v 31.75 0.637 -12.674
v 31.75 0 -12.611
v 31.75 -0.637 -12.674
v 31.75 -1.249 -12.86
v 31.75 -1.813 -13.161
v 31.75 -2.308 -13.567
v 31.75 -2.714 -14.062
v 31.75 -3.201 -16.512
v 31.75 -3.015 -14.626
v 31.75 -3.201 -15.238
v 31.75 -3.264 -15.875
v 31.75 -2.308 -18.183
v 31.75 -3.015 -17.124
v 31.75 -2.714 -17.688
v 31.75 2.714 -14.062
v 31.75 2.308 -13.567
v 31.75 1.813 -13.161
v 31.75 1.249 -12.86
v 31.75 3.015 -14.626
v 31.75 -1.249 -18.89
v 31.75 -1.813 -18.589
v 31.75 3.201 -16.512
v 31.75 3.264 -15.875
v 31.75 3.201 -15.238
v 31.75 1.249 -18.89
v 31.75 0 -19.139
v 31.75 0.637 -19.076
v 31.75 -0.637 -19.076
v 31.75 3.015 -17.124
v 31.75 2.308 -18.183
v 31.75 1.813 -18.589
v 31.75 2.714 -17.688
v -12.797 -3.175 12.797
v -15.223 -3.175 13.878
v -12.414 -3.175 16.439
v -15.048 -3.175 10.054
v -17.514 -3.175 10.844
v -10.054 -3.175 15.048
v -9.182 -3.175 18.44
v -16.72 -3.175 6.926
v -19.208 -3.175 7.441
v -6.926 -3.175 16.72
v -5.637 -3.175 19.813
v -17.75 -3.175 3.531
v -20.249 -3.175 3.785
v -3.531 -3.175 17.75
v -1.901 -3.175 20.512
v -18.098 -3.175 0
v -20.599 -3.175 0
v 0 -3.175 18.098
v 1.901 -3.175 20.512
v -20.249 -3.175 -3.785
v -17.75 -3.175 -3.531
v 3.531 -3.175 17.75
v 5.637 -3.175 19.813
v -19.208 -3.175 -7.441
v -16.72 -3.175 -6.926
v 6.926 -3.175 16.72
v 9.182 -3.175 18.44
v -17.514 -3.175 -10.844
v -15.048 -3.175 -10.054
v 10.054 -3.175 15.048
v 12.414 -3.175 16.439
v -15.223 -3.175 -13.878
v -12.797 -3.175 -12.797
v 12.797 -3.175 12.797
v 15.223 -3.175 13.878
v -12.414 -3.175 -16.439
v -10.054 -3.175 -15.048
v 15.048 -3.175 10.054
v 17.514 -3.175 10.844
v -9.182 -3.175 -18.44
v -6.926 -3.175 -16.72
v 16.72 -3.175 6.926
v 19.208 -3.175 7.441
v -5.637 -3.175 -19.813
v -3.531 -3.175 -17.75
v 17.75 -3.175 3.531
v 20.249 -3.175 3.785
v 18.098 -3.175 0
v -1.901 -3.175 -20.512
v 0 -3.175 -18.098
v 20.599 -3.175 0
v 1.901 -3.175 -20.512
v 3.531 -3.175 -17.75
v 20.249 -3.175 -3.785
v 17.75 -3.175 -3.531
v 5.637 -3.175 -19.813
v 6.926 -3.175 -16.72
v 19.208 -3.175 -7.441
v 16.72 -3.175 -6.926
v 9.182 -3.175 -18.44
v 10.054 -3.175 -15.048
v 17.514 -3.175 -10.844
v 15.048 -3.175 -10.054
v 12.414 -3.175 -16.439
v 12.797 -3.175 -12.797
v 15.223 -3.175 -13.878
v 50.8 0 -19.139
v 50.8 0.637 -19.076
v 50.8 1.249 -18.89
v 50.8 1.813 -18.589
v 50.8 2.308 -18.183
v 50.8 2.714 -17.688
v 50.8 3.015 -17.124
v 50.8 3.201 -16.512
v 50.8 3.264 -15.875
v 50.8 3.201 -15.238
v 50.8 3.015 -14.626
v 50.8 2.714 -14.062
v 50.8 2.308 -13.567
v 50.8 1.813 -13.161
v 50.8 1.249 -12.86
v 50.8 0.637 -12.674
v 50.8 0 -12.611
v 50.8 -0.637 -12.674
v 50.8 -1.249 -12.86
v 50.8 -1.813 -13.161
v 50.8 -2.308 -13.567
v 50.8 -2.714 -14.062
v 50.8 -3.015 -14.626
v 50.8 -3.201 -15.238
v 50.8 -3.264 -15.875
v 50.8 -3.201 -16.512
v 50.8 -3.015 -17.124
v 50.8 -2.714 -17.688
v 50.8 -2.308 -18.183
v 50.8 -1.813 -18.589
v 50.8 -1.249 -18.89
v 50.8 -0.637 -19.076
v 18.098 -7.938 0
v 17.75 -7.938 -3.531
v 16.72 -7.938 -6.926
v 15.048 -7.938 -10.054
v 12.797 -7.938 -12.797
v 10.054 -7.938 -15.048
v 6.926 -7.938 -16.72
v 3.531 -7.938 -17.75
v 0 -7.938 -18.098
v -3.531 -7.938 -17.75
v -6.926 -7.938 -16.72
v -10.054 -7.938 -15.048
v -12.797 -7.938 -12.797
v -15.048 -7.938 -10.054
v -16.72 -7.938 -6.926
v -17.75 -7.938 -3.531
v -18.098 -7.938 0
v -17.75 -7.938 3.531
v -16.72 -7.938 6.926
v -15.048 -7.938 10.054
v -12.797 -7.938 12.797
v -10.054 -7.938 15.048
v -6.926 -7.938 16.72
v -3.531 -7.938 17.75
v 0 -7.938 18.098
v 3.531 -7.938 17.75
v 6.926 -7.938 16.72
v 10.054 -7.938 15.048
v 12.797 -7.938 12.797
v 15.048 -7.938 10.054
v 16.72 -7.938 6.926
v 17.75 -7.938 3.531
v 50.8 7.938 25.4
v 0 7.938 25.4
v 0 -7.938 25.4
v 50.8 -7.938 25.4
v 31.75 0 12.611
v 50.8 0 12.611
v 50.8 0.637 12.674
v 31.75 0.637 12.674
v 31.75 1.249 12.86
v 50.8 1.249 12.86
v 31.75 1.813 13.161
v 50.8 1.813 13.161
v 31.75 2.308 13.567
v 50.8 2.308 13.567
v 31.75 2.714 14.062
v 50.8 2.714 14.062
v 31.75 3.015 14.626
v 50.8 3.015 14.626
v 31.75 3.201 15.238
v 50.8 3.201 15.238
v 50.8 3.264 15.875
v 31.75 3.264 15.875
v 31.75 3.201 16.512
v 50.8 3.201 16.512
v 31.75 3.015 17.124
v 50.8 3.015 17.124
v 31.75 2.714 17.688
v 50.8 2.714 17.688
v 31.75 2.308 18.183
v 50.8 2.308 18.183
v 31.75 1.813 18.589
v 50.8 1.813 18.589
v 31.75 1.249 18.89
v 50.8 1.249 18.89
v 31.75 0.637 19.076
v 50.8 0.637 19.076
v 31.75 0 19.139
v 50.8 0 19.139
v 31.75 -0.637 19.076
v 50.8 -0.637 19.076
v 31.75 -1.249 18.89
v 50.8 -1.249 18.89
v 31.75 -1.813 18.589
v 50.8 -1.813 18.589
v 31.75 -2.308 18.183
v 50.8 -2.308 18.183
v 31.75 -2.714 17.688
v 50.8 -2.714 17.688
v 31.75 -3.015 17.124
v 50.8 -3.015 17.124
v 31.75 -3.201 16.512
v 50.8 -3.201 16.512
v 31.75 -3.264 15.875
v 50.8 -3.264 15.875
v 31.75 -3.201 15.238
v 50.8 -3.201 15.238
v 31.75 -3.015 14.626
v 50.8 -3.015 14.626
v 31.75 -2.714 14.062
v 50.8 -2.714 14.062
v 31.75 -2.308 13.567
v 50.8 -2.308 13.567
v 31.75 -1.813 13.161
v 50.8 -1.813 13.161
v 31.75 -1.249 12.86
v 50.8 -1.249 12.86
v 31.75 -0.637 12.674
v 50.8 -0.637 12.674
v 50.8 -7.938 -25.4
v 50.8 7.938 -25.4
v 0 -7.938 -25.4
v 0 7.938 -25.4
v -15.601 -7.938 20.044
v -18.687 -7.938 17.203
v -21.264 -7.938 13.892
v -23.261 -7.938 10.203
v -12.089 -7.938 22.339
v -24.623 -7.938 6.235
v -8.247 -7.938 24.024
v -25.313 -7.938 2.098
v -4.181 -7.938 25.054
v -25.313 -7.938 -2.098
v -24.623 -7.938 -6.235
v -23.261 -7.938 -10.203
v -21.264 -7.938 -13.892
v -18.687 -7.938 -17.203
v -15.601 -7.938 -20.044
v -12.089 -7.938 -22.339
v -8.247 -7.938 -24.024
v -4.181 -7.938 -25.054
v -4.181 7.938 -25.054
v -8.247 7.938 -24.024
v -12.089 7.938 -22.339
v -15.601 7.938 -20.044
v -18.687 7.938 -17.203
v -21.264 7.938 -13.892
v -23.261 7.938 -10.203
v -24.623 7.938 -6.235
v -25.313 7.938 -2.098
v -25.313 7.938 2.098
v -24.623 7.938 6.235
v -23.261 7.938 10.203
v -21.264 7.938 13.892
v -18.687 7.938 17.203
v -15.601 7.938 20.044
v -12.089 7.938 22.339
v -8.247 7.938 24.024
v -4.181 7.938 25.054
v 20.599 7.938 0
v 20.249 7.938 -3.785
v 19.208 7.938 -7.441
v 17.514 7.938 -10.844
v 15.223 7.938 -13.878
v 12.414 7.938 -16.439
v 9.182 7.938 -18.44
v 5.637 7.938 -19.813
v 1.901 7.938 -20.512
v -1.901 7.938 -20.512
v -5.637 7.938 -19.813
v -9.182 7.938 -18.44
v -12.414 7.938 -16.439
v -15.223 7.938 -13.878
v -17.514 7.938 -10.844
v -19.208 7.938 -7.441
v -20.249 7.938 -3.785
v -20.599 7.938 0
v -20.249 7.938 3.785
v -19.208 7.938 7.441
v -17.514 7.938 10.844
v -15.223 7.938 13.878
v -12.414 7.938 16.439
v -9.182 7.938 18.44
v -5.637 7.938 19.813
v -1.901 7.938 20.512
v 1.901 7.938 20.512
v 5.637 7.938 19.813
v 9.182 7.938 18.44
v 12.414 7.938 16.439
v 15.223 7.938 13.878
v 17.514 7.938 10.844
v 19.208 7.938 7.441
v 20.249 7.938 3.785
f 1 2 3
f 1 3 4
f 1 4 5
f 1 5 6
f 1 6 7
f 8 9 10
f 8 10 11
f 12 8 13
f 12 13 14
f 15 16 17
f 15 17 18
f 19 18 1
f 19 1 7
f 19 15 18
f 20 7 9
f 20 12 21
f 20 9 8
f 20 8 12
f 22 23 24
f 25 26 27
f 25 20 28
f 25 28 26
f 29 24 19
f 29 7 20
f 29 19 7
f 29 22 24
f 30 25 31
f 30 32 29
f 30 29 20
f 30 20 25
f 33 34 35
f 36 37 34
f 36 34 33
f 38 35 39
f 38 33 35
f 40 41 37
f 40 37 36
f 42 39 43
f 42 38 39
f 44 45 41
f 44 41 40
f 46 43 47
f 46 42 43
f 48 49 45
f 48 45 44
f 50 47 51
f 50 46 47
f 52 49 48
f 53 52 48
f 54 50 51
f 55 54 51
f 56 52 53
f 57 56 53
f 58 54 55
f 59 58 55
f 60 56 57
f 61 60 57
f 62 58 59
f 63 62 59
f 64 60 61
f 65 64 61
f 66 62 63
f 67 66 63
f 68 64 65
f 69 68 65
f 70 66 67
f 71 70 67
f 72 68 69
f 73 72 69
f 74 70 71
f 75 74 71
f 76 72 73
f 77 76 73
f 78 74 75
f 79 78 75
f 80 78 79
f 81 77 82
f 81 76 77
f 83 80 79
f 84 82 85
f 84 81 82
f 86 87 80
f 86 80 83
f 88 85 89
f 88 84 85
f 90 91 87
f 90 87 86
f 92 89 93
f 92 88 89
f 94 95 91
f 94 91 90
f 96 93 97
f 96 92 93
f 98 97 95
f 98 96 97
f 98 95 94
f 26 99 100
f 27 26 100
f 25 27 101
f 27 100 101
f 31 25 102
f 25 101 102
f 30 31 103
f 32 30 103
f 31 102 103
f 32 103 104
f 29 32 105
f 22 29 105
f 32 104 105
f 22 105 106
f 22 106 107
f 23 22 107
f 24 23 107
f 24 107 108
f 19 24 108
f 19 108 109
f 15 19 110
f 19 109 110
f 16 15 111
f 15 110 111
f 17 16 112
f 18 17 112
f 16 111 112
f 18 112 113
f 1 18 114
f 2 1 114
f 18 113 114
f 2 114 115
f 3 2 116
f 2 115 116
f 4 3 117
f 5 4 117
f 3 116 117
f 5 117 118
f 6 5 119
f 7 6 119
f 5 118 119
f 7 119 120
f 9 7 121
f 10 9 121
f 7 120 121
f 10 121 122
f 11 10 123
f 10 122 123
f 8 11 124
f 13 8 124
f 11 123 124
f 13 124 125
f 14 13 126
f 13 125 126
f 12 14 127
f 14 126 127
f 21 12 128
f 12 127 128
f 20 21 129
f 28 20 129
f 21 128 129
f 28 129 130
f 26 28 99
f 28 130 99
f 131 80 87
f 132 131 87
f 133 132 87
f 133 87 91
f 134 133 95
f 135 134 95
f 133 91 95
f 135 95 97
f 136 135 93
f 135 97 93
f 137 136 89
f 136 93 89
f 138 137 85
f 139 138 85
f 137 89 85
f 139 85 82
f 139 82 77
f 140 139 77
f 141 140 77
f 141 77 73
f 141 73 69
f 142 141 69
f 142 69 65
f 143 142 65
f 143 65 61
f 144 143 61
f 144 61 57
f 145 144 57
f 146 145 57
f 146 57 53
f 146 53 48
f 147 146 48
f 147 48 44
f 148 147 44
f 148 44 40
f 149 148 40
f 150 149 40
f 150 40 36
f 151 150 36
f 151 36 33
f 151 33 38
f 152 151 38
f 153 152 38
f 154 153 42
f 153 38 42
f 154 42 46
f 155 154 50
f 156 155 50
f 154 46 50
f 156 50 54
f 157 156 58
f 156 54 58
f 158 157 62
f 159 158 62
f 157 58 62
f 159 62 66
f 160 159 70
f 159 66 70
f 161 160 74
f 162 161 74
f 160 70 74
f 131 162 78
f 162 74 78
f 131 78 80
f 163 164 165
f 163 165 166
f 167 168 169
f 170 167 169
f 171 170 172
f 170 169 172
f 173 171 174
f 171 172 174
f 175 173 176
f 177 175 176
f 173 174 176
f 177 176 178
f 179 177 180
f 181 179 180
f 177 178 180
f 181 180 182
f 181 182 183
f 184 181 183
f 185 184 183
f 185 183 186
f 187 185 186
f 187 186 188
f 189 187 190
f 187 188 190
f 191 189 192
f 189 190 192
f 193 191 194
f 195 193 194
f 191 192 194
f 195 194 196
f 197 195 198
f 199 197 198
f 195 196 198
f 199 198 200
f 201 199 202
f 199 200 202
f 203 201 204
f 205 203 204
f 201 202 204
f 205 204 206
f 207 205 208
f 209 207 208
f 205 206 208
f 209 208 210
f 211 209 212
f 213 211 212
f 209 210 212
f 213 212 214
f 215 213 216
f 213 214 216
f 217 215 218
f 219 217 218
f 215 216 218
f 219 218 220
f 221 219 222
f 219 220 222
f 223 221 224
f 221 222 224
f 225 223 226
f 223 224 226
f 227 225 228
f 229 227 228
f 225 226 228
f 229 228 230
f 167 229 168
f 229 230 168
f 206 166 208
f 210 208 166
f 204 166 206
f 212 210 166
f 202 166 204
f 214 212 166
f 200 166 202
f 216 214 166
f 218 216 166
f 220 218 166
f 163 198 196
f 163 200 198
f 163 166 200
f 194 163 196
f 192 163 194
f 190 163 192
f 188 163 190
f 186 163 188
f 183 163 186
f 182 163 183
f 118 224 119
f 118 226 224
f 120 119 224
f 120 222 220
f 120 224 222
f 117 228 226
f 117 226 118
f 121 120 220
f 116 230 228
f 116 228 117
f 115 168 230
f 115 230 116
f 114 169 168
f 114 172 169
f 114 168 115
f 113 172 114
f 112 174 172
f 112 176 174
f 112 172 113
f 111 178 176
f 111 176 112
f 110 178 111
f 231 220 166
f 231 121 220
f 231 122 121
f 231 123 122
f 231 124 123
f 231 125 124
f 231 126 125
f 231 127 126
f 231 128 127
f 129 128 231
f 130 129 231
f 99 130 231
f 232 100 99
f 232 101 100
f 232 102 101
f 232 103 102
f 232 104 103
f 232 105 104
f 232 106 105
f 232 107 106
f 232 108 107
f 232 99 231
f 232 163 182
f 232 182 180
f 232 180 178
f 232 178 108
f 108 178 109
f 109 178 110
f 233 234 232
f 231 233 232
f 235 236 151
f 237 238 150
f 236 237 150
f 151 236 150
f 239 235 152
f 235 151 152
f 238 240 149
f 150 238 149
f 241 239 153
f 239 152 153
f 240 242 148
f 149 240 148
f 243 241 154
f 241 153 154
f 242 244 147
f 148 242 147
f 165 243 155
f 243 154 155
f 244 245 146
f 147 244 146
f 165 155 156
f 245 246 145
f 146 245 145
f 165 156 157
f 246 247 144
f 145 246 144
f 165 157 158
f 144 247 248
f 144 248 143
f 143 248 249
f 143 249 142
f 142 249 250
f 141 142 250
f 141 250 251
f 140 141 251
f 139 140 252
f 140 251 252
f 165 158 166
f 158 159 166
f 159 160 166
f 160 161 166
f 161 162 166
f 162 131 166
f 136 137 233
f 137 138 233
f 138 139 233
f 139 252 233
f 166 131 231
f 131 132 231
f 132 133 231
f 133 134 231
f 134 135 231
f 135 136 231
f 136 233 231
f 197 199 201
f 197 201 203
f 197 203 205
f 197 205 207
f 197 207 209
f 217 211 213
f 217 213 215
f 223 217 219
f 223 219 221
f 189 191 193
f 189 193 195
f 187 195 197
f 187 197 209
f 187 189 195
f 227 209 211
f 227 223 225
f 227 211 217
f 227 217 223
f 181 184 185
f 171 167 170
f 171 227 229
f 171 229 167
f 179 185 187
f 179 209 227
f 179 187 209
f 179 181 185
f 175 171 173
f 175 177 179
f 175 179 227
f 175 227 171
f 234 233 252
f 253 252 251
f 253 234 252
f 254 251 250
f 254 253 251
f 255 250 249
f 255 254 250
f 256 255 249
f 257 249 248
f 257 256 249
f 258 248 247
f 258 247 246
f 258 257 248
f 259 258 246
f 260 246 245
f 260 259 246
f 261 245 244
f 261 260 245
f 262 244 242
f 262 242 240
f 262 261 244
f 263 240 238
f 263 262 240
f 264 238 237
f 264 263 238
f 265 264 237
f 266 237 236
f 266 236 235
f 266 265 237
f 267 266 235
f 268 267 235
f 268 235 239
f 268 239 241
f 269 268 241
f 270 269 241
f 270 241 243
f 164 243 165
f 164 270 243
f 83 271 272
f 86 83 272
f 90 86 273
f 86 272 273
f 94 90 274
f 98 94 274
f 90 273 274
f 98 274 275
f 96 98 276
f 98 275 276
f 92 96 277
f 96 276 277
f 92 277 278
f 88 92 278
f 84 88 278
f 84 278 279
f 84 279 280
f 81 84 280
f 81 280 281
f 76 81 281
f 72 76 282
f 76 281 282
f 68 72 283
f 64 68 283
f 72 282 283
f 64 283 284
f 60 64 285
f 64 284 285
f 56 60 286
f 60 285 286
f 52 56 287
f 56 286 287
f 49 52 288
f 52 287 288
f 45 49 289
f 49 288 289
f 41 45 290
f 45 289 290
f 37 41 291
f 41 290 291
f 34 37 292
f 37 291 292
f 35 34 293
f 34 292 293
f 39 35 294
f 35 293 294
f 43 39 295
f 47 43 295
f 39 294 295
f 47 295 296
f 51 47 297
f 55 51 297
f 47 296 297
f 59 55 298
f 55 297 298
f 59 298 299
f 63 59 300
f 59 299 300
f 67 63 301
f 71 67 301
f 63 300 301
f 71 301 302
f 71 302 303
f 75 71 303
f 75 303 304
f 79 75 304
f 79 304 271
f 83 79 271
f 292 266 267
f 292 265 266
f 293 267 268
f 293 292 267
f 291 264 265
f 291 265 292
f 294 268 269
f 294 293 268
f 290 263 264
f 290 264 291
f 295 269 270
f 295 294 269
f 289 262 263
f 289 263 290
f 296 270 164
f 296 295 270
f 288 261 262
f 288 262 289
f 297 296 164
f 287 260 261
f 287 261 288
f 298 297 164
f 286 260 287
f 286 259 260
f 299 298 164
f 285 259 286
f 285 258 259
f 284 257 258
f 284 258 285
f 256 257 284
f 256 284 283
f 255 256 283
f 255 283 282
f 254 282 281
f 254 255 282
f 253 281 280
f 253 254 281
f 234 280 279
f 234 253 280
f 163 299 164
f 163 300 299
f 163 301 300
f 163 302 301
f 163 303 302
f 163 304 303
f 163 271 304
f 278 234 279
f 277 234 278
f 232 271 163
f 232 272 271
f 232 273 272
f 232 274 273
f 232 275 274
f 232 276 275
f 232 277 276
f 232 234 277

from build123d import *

# Parameters (mm, degrees)
SKETCH1_W           = 76.2
SKETCH1_H           = 50.8
BOSS_EXTRUDE1_DEPTH = 7.9375
SKETCH2_R           = 20.5994
CUT_EXTRUDE1_DEPTH  = 11.1125
SKETCH3_R           = 18.0975
CUT_EXTRUDE2_DEPTH  = 12.7
SKETCH7_R           = 3.2639
CUT_EXTRUDE6_DEPTH  = 19.05
CUT_EXTRUDE7_DEPTH  = 16.875


with BuildPart() as part:
    # Sketch1 → Boss-Extrude1 (new body, symmetric)
    with BuildSketch(Plane(origin=(0, 0, 0), x_dir=(1, 0, 0), z_dir=(0, 1, 0))):
        with Locations((12.7, 0)):
            Rectangle(SKETCH1_W, SKETCH1_H)
    extrude(amount=BOSS_EXTRUDE1_DEPTH, both=True)

    # Sketch2 → Cut-Extrude1 (cut)
    with BuildSketch(Plane(origin=(0, 7.9375, 0), x_dir=(1, 0, 0), z_dir=(0, 1, 0))):
        Circle(SKETCH2_R)
    extrude(amount=-CUT_EXTRUDE1_DEPTH, mode=Mode.SUBTRACT)

    # Sketch3 → Cut-Extrude2 (cut)
    with BuildSketch(Plane(origin=(0, -3.175, 0), x_dir=(1, 0, 0), z_dir=(0, 1, 0))):
        Circle(SKETCH3_R)
    extrude(amount=-CUT_EXTRUDE2_DEPTH, mode=Mode.SUBTRACT)

    # Sketch7 → Cut-Extrude6 (cut)
    with BuildSketch(Plane(origin=(50.8, 0, 0), x_dir=(0, 0, -1), z_dir=(1, 0, 0))):
        with Locations((-15.875, 0)):
            Circle(SKETCH7_R)
        with Locations((15.875, 0)):
            Circle(SKETCH7_R)
    extrude(amount=-CUT_EXTRUDE6_DEPTH, mode=Mode.SUBTRACT)

    # Sketch8 → Cut-Extrude7 (cut, through all)
    with BuildSketch(Plane(origin=(0, 7.9375, 0), x_dir=(1, 0, 0), z_dir=(0, 1, 0))):
        with BuildLine():
            Line((0, -25.4), (0, -38.1))
            Line((0, -38.1), (-50.8, -38.1))
            Line((-50.8, -38.1), (-50.8, 38.1))
            Line((-50.8, 38.1), (0, 38.1))
            Line((0, 38.1), (0, 25.4))
            ThreePointArc((0, 25.4), (-25.4, 0), (0, -25.4))
        make_face()
    extrude(amount=-CUT_EXTRUDE7_DEPTH, mode=Mode.SUBTRACT)


solid = part.part
